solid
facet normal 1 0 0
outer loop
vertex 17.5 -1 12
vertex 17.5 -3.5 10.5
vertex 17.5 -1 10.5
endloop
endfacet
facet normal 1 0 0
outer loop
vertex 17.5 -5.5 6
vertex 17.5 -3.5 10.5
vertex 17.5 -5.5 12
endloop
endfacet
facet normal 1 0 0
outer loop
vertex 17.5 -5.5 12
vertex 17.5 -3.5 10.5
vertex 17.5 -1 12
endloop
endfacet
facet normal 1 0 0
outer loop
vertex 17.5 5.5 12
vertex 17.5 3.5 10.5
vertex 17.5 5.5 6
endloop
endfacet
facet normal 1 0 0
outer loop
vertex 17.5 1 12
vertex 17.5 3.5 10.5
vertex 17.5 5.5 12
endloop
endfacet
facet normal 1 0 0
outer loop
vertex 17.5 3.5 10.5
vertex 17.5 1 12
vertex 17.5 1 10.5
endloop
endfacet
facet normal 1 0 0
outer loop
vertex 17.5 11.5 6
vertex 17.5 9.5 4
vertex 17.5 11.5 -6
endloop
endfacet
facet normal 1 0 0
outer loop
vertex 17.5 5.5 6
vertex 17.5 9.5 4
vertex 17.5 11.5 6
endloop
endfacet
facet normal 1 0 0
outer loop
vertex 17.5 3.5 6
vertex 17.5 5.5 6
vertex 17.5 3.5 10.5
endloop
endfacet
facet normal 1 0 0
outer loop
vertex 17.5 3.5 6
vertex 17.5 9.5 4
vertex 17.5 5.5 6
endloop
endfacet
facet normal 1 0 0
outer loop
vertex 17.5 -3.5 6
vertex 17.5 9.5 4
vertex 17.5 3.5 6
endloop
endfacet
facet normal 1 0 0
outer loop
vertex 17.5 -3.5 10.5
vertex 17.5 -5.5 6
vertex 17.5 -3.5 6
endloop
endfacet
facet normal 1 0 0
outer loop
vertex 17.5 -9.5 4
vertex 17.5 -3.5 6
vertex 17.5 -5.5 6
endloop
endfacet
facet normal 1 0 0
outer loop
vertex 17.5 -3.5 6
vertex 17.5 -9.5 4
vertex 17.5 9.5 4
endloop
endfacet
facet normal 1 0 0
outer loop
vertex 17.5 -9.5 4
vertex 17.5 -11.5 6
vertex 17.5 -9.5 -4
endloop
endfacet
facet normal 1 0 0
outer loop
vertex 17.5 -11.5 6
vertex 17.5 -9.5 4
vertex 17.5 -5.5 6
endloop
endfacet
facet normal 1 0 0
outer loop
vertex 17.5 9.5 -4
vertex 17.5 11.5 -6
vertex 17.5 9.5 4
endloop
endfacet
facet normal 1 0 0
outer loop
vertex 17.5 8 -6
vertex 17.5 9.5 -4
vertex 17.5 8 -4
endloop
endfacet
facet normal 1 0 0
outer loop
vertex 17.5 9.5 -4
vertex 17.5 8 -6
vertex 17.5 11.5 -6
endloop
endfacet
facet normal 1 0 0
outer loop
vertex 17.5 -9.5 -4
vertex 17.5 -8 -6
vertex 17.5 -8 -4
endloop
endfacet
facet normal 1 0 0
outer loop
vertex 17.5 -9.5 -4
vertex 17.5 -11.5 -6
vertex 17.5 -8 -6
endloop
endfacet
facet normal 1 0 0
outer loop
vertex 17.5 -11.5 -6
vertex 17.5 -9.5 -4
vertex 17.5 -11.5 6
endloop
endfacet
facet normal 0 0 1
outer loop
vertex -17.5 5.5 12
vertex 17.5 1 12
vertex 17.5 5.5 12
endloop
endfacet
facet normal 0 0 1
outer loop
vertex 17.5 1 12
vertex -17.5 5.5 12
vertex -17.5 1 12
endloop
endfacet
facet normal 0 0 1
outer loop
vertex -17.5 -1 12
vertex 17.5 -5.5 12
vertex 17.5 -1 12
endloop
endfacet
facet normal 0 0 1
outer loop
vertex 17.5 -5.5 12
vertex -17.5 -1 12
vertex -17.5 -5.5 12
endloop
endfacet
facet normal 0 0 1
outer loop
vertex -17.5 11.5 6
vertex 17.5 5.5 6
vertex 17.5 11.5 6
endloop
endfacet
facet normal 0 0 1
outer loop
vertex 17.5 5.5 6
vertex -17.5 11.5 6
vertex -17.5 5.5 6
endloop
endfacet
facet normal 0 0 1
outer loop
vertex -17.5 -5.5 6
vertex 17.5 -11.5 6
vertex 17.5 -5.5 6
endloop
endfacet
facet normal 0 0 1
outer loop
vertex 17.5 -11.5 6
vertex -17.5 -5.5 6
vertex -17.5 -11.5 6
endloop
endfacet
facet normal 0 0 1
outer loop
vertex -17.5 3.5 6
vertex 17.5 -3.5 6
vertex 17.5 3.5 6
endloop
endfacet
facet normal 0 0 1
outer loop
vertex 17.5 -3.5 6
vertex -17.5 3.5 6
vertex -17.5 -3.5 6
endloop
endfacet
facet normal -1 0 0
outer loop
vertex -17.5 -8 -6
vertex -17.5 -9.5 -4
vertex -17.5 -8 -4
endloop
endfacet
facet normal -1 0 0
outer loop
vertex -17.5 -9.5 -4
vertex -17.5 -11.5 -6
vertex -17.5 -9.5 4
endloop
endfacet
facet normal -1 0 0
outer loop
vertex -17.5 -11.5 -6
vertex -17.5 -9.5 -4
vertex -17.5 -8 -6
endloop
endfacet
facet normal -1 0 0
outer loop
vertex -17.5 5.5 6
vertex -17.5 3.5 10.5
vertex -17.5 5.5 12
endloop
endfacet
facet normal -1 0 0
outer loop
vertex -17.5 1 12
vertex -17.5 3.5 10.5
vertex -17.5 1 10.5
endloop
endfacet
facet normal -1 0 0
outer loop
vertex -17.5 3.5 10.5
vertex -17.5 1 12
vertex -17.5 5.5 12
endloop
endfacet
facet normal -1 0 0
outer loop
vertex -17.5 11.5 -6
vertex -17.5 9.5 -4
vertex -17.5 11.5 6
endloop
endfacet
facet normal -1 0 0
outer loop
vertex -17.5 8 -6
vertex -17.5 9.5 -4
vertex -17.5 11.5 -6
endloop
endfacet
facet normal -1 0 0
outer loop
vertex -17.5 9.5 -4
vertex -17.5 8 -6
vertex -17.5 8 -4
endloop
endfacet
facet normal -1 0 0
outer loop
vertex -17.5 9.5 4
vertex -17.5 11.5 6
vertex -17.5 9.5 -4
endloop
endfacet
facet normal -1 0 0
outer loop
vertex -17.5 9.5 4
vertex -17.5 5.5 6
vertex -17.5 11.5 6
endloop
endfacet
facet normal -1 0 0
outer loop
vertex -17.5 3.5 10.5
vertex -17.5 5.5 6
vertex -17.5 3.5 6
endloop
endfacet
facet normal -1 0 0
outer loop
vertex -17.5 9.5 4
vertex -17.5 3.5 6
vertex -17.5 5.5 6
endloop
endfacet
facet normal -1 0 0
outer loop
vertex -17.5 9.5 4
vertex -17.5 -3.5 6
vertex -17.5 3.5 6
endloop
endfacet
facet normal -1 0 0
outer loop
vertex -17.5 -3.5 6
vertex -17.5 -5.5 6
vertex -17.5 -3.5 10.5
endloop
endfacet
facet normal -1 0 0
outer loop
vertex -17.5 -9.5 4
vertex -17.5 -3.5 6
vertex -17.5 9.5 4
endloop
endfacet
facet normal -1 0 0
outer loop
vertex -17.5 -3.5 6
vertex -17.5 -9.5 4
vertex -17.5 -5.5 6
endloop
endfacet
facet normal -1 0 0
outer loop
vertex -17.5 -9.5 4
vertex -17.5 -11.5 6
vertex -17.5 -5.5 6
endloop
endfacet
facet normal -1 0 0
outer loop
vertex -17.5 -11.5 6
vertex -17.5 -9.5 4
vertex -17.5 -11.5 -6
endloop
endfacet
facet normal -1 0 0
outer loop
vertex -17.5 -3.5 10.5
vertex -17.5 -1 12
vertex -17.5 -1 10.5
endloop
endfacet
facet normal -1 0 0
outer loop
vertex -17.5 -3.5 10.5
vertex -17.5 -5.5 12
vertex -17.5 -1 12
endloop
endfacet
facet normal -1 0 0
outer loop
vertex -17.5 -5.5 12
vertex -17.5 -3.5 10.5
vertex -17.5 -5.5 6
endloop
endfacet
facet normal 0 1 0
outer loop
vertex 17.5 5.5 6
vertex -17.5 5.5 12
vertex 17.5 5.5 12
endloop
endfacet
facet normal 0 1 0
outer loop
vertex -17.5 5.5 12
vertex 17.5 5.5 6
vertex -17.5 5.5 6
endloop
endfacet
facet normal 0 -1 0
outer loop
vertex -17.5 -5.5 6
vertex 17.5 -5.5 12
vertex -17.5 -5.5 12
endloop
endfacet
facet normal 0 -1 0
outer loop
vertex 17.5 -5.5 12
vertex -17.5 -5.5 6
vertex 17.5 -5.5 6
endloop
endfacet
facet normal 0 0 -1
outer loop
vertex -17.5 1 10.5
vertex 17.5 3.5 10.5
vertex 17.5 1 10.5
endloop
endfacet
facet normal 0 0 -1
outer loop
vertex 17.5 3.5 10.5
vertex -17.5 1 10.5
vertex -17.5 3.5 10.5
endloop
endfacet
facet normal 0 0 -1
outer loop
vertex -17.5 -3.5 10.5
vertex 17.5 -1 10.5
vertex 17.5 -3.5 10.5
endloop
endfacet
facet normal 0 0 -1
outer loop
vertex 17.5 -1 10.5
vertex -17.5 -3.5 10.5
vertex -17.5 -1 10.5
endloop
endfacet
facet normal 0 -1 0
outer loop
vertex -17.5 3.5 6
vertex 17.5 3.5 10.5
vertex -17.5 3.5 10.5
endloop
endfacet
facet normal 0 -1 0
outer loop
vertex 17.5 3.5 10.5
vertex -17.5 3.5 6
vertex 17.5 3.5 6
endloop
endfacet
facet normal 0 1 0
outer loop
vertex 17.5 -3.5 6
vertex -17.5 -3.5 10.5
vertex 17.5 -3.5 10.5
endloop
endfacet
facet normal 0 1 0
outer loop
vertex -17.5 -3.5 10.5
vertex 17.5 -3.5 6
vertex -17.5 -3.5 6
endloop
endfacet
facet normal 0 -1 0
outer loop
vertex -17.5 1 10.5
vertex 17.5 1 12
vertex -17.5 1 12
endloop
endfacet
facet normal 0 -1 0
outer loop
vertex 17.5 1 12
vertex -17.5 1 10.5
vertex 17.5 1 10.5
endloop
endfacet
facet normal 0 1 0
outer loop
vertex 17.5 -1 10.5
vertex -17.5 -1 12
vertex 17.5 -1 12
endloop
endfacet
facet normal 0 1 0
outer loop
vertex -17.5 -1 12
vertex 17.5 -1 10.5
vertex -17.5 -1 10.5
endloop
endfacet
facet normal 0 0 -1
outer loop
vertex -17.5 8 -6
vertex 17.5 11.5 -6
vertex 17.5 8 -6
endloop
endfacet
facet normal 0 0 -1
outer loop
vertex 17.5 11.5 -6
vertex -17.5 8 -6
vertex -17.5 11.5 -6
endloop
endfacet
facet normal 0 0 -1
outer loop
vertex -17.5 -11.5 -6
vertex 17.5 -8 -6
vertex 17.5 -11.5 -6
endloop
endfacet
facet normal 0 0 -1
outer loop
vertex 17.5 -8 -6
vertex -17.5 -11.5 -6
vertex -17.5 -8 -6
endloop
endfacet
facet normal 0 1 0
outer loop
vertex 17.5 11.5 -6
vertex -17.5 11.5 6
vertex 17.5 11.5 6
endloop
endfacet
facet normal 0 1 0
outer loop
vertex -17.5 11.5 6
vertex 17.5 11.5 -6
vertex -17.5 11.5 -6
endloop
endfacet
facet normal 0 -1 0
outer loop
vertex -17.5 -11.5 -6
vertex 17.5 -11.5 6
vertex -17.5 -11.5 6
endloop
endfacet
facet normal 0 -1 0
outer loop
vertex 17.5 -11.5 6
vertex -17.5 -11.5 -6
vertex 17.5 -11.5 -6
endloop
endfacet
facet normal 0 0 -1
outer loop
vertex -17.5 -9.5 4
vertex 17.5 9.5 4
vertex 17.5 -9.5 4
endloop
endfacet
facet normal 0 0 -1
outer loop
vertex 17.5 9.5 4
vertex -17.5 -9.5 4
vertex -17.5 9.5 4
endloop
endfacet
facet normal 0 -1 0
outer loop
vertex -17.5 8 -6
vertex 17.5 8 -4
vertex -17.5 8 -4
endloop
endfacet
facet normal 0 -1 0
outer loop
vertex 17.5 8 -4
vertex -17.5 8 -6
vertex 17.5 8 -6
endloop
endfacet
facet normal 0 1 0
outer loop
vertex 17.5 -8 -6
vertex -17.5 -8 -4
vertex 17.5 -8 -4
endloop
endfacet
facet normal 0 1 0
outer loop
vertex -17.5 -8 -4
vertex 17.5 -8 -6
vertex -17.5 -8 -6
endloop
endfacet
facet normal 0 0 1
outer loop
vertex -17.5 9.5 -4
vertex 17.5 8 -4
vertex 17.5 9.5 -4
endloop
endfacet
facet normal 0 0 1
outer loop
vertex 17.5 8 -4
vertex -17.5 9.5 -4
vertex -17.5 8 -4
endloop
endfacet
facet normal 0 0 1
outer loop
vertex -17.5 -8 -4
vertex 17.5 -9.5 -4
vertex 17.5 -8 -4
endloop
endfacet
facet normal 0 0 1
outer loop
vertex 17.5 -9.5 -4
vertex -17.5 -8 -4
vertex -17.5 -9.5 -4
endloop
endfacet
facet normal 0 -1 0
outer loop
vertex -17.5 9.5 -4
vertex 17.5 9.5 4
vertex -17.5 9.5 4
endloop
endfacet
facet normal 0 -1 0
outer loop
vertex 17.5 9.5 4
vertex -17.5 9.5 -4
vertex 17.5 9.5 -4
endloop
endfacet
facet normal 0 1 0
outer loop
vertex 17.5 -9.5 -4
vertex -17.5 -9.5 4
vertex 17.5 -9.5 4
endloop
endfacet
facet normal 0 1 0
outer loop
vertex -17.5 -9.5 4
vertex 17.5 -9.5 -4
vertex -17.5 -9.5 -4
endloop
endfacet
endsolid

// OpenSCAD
union() {
	difference() {
		difference() {	
			translate([0,0,9])
				cube([35, 11, 6], center=true);
			translate([-1,0,8])
				cube([74, 7, 5], center=true);
		}
		translate([-1,0,10])
			cube([74, 2, 5], center=true);	
	}
	difference() {
		difference() {
			cube([35,23,12], center=true);
			translate([2, 0, -2])
			   cube([70,16,12], center=true);
		}
		translate([2, 0, 0])
		   cube([70,19,8], center=true);	
	}
}
